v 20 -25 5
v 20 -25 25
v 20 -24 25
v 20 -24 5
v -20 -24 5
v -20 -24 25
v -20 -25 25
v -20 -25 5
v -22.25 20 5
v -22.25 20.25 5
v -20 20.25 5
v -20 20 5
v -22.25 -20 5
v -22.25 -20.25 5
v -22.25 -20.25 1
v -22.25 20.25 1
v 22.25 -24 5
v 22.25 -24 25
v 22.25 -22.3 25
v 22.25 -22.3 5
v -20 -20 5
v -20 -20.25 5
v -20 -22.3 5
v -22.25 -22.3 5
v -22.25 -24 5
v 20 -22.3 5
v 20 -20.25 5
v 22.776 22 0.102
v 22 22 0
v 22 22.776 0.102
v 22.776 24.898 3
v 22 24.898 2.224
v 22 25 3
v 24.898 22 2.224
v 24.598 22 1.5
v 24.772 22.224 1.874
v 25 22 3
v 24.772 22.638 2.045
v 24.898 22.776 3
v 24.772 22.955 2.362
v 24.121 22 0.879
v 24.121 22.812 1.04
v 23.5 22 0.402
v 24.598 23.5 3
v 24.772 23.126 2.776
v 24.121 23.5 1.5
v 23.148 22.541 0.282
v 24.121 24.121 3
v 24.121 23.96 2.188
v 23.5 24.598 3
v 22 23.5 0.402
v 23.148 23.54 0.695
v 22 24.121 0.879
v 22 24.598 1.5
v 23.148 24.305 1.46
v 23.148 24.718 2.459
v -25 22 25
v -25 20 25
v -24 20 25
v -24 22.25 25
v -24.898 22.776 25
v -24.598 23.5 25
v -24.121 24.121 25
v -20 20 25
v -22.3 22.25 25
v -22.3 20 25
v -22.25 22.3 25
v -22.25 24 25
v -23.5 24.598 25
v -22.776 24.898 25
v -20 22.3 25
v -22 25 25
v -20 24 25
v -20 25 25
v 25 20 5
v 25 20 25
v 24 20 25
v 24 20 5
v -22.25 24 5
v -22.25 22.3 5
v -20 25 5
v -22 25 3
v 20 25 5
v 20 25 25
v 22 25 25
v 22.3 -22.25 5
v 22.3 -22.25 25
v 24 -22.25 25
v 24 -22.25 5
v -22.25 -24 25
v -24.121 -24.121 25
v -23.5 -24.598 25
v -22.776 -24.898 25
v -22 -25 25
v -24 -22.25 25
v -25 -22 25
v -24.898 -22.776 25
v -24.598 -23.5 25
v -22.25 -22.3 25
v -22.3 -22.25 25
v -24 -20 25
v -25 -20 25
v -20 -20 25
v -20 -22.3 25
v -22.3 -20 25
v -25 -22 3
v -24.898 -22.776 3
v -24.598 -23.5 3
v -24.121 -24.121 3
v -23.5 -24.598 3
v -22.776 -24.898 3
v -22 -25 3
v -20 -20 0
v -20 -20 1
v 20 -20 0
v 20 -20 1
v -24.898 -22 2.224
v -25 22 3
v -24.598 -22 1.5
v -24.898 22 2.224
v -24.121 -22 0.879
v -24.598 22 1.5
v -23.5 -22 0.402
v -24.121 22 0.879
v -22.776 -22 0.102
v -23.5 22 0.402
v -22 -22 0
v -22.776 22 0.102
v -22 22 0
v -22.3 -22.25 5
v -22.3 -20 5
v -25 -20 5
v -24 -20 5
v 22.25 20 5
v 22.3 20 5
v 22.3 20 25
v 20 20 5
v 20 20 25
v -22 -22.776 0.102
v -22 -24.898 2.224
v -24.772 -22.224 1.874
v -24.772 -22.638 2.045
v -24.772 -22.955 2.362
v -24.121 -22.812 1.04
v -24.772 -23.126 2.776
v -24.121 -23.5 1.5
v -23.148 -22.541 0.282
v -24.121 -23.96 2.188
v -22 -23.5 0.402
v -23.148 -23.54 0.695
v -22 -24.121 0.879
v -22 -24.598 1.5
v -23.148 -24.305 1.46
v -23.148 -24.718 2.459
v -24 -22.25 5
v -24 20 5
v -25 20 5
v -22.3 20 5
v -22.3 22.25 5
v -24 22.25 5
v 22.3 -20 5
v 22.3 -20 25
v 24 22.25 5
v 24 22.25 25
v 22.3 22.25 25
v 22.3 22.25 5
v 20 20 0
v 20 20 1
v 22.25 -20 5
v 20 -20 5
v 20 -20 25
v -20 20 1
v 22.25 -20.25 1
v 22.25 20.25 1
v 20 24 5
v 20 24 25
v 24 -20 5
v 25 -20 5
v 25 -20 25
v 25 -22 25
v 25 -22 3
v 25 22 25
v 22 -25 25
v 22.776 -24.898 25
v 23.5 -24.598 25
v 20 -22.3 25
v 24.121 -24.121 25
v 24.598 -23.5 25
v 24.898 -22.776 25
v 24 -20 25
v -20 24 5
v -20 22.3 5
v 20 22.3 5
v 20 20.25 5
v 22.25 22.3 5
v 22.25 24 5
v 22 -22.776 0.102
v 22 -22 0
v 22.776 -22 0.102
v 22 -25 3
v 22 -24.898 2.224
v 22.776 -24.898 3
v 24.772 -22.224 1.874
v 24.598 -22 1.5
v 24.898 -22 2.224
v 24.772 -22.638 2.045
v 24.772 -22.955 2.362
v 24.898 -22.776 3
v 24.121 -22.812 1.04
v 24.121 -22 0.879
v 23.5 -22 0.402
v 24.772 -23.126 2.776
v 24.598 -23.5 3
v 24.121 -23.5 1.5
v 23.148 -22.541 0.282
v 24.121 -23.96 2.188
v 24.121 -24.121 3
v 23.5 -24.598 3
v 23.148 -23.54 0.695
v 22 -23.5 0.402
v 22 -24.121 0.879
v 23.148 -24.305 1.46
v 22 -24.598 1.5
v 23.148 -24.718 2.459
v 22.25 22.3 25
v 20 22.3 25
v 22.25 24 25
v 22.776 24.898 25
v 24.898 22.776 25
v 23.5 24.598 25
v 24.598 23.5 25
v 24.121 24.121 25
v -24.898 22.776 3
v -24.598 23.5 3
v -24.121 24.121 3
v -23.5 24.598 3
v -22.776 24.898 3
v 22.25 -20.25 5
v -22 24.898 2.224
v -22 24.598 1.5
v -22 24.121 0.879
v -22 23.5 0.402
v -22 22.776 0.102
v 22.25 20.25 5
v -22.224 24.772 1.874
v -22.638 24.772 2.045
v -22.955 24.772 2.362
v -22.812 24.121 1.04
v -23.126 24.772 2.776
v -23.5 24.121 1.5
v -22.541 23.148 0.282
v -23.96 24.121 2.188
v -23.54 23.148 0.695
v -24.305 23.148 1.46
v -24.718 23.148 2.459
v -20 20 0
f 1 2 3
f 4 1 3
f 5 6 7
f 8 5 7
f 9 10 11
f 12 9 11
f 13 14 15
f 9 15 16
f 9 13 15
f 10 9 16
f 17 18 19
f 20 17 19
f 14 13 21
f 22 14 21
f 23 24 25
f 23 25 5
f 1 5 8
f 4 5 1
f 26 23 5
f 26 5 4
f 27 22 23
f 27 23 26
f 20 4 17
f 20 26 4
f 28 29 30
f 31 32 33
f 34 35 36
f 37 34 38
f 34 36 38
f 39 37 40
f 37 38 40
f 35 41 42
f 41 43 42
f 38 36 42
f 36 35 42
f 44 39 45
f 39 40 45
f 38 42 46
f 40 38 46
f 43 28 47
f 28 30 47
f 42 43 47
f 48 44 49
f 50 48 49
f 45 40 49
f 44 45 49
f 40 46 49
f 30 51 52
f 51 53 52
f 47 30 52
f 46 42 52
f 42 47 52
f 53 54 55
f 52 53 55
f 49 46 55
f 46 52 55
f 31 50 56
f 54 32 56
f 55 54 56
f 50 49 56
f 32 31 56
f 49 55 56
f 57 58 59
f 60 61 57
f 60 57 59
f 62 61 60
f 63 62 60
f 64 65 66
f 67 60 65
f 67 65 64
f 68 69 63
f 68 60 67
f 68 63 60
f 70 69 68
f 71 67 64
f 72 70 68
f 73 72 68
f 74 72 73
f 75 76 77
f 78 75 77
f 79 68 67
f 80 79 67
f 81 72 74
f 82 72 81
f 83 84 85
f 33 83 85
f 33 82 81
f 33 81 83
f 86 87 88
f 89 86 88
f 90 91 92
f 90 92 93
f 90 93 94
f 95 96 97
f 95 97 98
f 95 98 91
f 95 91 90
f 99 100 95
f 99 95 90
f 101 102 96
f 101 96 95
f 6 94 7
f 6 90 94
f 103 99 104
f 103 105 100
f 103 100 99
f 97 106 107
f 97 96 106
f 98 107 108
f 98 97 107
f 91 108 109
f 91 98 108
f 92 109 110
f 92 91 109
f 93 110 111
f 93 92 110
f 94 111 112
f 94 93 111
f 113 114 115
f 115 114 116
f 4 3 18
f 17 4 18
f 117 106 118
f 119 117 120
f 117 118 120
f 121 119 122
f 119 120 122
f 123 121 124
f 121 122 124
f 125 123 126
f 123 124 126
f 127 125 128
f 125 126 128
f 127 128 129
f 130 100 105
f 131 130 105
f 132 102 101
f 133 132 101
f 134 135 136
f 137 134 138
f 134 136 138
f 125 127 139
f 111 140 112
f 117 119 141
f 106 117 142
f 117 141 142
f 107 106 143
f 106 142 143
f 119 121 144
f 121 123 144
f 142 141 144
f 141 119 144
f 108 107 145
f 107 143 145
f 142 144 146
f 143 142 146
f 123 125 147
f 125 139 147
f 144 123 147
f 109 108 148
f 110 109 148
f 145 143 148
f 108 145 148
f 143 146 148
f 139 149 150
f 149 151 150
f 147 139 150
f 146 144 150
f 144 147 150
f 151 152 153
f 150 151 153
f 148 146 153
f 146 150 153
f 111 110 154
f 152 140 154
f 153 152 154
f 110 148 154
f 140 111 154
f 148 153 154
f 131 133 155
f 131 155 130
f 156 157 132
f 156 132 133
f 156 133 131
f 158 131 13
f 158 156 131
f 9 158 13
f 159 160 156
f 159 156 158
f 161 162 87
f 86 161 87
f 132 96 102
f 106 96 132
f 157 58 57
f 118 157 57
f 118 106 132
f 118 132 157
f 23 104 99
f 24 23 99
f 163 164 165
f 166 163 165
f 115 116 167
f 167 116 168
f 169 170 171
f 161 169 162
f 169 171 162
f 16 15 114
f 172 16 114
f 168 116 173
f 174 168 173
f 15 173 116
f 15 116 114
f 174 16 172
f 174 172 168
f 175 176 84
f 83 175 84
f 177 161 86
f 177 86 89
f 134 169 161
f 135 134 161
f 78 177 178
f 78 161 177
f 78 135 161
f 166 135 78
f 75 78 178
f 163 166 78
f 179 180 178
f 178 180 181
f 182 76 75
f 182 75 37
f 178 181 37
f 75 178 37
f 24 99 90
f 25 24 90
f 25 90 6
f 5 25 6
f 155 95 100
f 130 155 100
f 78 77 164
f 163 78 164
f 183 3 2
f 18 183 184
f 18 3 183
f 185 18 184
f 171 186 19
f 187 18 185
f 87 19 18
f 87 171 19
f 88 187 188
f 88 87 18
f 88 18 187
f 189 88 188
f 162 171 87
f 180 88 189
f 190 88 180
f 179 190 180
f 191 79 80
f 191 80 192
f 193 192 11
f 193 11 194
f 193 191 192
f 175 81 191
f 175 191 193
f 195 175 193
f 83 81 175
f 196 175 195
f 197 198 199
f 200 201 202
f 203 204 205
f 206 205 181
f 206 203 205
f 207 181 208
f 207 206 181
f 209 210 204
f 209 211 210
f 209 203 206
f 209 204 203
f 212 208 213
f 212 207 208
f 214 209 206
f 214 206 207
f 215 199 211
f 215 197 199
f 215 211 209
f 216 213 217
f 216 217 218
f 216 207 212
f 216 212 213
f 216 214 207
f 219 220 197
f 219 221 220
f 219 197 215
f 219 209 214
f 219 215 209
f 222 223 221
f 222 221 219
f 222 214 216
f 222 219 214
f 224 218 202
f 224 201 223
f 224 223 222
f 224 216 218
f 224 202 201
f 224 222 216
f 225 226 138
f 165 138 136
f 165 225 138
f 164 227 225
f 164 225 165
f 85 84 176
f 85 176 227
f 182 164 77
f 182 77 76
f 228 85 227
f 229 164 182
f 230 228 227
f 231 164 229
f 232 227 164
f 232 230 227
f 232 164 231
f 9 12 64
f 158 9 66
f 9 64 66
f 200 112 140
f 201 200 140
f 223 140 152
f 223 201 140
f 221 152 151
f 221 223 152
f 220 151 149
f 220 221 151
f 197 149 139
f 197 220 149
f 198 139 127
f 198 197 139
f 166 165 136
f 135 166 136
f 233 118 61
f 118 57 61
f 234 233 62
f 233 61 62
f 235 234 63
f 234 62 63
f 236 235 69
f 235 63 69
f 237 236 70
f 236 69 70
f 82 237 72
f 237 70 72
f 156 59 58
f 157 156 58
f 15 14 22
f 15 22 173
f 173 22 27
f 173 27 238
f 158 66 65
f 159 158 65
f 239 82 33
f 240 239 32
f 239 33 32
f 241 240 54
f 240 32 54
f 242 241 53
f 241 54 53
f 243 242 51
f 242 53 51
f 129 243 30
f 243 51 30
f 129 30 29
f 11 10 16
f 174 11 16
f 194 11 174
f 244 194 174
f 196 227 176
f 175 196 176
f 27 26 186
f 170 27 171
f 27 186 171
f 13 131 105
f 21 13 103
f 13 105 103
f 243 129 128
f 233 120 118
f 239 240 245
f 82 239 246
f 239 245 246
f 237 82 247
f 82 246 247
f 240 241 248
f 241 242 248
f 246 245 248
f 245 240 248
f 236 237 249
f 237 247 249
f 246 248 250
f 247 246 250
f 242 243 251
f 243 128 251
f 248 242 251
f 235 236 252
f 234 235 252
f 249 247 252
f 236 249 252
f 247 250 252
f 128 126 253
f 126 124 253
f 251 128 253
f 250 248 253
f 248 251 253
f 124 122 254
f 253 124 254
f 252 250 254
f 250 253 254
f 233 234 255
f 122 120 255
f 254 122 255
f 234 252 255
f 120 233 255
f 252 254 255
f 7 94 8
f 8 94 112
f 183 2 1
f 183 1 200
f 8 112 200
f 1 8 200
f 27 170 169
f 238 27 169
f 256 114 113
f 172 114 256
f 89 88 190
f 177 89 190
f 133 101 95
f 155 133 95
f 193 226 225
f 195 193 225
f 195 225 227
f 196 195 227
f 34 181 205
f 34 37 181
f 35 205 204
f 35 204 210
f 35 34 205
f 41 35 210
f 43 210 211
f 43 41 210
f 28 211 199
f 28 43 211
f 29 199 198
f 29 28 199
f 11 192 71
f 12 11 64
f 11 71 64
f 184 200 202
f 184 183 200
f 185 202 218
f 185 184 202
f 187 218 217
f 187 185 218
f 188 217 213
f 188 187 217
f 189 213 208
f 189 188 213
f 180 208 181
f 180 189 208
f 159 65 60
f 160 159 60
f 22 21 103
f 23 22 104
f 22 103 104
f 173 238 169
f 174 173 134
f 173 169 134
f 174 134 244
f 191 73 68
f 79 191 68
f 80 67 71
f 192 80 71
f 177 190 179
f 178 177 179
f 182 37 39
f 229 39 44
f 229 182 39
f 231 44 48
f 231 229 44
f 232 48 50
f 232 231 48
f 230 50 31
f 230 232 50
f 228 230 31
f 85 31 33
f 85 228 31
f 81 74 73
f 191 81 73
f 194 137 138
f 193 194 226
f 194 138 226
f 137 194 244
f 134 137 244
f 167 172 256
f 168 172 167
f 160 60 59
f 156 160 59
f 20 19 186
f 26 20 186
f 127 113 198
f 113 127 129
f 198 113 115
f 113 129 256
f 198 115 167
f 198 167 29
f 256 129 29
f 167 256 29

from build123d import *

# Parameters (mm, degrees)
SKETCH_W        = 50
SKETCH_H        = 50
PAD_DEPTH       = 25
FILLET_R        = 3
POCKET_DEPTH    = 20
SKETCH008_W     = 44.5
SKETCH008_H     = 40.5
POCKET001_DEPTH = 4
SKETCH009_W     = 40
SKETCH009_H     = 40
POCKET002_DEPTH = 1


with BuildPart() as part:
    # Sketch → Pad (new body)
    with BuildSketch(Plane.XY):
        Rectangle(SKETCH_W, SKETCH_H)
    extrude(amount=PAD_DEPTH)

    # Fillet
    fillet_edges = [part.edges().sort_by_distance(p)[0] for p in [
        (0, -25, 0),
        (-25, 0, 0),
        (0, 25, 0),
        (25, 0, 0),
        (-25, -25, 12.5),
        (25, 25, 12.5),
        (-25, 25, 12.5),
        (25, -25, 12.5),
    ]]
    fillet(fillet_edges, radius=FILLET_R)

    # Sketch007 (on Face2 of Fillet) → Pocket (cut)
    with BuildSketch(Plane.XY.offset(25)):
        Polygon((-20, 25), (-20, 24), (-22.25, 24), (-22.25, 22.3), (-20, 22.3), (-20, 20), (-22.3, 20), (-22.3, 22.25), (-24, 22.25), (-24, 20), (-25, 20), (-25, -20), (-24, -20), (-24, -22.25), (-22.3, -22.25), (-22.3, -20), (-20, -20), (-20, -22.3), (-22.25, -22.3), (-22.25, -24), (-20, -24), (-20, -25), (20, -25), (20, -24), (22.25, -24), (22.25, -22.3), (20, -22.3), (20, -20), (22.3, -20), (22.3, -22.25), (24, -22.25), (24, -20), (25, -20), (25, 20), (24, 20), (24, 22.25), (22.3, 22.25), (22.3, 20), (20, 20), (20, 22.3), (22.25, 22.3), (22.25, 24), (20, 24), (20, 25), align=None)
    extrude(amount=-POCKET_DEPTH, mode=Mode.SUBTRACT)

    # Sketch008 (on Face7 of Pocket) → Pocket001 (cut)
    with BuildSketch(Plane.XY.offset(5)):
        Rectangle(SKETCH008_W, SKETCH008_H)
    extrude(amount=-POCKET001_DEPTH, mode=Mode.SUBTRACT)

    # Sketch009 (on Face49 of Pocket001) → Pocket002 (cut)
    with BuildSketch(Plane.XY.offset(1)):
        Rectangle(SKETCH009_W, SKETCH009_H)
    extrude(amount=-POCKET002_DEPTH, mode=Mode.SUBTRACT)


solid = part.part
